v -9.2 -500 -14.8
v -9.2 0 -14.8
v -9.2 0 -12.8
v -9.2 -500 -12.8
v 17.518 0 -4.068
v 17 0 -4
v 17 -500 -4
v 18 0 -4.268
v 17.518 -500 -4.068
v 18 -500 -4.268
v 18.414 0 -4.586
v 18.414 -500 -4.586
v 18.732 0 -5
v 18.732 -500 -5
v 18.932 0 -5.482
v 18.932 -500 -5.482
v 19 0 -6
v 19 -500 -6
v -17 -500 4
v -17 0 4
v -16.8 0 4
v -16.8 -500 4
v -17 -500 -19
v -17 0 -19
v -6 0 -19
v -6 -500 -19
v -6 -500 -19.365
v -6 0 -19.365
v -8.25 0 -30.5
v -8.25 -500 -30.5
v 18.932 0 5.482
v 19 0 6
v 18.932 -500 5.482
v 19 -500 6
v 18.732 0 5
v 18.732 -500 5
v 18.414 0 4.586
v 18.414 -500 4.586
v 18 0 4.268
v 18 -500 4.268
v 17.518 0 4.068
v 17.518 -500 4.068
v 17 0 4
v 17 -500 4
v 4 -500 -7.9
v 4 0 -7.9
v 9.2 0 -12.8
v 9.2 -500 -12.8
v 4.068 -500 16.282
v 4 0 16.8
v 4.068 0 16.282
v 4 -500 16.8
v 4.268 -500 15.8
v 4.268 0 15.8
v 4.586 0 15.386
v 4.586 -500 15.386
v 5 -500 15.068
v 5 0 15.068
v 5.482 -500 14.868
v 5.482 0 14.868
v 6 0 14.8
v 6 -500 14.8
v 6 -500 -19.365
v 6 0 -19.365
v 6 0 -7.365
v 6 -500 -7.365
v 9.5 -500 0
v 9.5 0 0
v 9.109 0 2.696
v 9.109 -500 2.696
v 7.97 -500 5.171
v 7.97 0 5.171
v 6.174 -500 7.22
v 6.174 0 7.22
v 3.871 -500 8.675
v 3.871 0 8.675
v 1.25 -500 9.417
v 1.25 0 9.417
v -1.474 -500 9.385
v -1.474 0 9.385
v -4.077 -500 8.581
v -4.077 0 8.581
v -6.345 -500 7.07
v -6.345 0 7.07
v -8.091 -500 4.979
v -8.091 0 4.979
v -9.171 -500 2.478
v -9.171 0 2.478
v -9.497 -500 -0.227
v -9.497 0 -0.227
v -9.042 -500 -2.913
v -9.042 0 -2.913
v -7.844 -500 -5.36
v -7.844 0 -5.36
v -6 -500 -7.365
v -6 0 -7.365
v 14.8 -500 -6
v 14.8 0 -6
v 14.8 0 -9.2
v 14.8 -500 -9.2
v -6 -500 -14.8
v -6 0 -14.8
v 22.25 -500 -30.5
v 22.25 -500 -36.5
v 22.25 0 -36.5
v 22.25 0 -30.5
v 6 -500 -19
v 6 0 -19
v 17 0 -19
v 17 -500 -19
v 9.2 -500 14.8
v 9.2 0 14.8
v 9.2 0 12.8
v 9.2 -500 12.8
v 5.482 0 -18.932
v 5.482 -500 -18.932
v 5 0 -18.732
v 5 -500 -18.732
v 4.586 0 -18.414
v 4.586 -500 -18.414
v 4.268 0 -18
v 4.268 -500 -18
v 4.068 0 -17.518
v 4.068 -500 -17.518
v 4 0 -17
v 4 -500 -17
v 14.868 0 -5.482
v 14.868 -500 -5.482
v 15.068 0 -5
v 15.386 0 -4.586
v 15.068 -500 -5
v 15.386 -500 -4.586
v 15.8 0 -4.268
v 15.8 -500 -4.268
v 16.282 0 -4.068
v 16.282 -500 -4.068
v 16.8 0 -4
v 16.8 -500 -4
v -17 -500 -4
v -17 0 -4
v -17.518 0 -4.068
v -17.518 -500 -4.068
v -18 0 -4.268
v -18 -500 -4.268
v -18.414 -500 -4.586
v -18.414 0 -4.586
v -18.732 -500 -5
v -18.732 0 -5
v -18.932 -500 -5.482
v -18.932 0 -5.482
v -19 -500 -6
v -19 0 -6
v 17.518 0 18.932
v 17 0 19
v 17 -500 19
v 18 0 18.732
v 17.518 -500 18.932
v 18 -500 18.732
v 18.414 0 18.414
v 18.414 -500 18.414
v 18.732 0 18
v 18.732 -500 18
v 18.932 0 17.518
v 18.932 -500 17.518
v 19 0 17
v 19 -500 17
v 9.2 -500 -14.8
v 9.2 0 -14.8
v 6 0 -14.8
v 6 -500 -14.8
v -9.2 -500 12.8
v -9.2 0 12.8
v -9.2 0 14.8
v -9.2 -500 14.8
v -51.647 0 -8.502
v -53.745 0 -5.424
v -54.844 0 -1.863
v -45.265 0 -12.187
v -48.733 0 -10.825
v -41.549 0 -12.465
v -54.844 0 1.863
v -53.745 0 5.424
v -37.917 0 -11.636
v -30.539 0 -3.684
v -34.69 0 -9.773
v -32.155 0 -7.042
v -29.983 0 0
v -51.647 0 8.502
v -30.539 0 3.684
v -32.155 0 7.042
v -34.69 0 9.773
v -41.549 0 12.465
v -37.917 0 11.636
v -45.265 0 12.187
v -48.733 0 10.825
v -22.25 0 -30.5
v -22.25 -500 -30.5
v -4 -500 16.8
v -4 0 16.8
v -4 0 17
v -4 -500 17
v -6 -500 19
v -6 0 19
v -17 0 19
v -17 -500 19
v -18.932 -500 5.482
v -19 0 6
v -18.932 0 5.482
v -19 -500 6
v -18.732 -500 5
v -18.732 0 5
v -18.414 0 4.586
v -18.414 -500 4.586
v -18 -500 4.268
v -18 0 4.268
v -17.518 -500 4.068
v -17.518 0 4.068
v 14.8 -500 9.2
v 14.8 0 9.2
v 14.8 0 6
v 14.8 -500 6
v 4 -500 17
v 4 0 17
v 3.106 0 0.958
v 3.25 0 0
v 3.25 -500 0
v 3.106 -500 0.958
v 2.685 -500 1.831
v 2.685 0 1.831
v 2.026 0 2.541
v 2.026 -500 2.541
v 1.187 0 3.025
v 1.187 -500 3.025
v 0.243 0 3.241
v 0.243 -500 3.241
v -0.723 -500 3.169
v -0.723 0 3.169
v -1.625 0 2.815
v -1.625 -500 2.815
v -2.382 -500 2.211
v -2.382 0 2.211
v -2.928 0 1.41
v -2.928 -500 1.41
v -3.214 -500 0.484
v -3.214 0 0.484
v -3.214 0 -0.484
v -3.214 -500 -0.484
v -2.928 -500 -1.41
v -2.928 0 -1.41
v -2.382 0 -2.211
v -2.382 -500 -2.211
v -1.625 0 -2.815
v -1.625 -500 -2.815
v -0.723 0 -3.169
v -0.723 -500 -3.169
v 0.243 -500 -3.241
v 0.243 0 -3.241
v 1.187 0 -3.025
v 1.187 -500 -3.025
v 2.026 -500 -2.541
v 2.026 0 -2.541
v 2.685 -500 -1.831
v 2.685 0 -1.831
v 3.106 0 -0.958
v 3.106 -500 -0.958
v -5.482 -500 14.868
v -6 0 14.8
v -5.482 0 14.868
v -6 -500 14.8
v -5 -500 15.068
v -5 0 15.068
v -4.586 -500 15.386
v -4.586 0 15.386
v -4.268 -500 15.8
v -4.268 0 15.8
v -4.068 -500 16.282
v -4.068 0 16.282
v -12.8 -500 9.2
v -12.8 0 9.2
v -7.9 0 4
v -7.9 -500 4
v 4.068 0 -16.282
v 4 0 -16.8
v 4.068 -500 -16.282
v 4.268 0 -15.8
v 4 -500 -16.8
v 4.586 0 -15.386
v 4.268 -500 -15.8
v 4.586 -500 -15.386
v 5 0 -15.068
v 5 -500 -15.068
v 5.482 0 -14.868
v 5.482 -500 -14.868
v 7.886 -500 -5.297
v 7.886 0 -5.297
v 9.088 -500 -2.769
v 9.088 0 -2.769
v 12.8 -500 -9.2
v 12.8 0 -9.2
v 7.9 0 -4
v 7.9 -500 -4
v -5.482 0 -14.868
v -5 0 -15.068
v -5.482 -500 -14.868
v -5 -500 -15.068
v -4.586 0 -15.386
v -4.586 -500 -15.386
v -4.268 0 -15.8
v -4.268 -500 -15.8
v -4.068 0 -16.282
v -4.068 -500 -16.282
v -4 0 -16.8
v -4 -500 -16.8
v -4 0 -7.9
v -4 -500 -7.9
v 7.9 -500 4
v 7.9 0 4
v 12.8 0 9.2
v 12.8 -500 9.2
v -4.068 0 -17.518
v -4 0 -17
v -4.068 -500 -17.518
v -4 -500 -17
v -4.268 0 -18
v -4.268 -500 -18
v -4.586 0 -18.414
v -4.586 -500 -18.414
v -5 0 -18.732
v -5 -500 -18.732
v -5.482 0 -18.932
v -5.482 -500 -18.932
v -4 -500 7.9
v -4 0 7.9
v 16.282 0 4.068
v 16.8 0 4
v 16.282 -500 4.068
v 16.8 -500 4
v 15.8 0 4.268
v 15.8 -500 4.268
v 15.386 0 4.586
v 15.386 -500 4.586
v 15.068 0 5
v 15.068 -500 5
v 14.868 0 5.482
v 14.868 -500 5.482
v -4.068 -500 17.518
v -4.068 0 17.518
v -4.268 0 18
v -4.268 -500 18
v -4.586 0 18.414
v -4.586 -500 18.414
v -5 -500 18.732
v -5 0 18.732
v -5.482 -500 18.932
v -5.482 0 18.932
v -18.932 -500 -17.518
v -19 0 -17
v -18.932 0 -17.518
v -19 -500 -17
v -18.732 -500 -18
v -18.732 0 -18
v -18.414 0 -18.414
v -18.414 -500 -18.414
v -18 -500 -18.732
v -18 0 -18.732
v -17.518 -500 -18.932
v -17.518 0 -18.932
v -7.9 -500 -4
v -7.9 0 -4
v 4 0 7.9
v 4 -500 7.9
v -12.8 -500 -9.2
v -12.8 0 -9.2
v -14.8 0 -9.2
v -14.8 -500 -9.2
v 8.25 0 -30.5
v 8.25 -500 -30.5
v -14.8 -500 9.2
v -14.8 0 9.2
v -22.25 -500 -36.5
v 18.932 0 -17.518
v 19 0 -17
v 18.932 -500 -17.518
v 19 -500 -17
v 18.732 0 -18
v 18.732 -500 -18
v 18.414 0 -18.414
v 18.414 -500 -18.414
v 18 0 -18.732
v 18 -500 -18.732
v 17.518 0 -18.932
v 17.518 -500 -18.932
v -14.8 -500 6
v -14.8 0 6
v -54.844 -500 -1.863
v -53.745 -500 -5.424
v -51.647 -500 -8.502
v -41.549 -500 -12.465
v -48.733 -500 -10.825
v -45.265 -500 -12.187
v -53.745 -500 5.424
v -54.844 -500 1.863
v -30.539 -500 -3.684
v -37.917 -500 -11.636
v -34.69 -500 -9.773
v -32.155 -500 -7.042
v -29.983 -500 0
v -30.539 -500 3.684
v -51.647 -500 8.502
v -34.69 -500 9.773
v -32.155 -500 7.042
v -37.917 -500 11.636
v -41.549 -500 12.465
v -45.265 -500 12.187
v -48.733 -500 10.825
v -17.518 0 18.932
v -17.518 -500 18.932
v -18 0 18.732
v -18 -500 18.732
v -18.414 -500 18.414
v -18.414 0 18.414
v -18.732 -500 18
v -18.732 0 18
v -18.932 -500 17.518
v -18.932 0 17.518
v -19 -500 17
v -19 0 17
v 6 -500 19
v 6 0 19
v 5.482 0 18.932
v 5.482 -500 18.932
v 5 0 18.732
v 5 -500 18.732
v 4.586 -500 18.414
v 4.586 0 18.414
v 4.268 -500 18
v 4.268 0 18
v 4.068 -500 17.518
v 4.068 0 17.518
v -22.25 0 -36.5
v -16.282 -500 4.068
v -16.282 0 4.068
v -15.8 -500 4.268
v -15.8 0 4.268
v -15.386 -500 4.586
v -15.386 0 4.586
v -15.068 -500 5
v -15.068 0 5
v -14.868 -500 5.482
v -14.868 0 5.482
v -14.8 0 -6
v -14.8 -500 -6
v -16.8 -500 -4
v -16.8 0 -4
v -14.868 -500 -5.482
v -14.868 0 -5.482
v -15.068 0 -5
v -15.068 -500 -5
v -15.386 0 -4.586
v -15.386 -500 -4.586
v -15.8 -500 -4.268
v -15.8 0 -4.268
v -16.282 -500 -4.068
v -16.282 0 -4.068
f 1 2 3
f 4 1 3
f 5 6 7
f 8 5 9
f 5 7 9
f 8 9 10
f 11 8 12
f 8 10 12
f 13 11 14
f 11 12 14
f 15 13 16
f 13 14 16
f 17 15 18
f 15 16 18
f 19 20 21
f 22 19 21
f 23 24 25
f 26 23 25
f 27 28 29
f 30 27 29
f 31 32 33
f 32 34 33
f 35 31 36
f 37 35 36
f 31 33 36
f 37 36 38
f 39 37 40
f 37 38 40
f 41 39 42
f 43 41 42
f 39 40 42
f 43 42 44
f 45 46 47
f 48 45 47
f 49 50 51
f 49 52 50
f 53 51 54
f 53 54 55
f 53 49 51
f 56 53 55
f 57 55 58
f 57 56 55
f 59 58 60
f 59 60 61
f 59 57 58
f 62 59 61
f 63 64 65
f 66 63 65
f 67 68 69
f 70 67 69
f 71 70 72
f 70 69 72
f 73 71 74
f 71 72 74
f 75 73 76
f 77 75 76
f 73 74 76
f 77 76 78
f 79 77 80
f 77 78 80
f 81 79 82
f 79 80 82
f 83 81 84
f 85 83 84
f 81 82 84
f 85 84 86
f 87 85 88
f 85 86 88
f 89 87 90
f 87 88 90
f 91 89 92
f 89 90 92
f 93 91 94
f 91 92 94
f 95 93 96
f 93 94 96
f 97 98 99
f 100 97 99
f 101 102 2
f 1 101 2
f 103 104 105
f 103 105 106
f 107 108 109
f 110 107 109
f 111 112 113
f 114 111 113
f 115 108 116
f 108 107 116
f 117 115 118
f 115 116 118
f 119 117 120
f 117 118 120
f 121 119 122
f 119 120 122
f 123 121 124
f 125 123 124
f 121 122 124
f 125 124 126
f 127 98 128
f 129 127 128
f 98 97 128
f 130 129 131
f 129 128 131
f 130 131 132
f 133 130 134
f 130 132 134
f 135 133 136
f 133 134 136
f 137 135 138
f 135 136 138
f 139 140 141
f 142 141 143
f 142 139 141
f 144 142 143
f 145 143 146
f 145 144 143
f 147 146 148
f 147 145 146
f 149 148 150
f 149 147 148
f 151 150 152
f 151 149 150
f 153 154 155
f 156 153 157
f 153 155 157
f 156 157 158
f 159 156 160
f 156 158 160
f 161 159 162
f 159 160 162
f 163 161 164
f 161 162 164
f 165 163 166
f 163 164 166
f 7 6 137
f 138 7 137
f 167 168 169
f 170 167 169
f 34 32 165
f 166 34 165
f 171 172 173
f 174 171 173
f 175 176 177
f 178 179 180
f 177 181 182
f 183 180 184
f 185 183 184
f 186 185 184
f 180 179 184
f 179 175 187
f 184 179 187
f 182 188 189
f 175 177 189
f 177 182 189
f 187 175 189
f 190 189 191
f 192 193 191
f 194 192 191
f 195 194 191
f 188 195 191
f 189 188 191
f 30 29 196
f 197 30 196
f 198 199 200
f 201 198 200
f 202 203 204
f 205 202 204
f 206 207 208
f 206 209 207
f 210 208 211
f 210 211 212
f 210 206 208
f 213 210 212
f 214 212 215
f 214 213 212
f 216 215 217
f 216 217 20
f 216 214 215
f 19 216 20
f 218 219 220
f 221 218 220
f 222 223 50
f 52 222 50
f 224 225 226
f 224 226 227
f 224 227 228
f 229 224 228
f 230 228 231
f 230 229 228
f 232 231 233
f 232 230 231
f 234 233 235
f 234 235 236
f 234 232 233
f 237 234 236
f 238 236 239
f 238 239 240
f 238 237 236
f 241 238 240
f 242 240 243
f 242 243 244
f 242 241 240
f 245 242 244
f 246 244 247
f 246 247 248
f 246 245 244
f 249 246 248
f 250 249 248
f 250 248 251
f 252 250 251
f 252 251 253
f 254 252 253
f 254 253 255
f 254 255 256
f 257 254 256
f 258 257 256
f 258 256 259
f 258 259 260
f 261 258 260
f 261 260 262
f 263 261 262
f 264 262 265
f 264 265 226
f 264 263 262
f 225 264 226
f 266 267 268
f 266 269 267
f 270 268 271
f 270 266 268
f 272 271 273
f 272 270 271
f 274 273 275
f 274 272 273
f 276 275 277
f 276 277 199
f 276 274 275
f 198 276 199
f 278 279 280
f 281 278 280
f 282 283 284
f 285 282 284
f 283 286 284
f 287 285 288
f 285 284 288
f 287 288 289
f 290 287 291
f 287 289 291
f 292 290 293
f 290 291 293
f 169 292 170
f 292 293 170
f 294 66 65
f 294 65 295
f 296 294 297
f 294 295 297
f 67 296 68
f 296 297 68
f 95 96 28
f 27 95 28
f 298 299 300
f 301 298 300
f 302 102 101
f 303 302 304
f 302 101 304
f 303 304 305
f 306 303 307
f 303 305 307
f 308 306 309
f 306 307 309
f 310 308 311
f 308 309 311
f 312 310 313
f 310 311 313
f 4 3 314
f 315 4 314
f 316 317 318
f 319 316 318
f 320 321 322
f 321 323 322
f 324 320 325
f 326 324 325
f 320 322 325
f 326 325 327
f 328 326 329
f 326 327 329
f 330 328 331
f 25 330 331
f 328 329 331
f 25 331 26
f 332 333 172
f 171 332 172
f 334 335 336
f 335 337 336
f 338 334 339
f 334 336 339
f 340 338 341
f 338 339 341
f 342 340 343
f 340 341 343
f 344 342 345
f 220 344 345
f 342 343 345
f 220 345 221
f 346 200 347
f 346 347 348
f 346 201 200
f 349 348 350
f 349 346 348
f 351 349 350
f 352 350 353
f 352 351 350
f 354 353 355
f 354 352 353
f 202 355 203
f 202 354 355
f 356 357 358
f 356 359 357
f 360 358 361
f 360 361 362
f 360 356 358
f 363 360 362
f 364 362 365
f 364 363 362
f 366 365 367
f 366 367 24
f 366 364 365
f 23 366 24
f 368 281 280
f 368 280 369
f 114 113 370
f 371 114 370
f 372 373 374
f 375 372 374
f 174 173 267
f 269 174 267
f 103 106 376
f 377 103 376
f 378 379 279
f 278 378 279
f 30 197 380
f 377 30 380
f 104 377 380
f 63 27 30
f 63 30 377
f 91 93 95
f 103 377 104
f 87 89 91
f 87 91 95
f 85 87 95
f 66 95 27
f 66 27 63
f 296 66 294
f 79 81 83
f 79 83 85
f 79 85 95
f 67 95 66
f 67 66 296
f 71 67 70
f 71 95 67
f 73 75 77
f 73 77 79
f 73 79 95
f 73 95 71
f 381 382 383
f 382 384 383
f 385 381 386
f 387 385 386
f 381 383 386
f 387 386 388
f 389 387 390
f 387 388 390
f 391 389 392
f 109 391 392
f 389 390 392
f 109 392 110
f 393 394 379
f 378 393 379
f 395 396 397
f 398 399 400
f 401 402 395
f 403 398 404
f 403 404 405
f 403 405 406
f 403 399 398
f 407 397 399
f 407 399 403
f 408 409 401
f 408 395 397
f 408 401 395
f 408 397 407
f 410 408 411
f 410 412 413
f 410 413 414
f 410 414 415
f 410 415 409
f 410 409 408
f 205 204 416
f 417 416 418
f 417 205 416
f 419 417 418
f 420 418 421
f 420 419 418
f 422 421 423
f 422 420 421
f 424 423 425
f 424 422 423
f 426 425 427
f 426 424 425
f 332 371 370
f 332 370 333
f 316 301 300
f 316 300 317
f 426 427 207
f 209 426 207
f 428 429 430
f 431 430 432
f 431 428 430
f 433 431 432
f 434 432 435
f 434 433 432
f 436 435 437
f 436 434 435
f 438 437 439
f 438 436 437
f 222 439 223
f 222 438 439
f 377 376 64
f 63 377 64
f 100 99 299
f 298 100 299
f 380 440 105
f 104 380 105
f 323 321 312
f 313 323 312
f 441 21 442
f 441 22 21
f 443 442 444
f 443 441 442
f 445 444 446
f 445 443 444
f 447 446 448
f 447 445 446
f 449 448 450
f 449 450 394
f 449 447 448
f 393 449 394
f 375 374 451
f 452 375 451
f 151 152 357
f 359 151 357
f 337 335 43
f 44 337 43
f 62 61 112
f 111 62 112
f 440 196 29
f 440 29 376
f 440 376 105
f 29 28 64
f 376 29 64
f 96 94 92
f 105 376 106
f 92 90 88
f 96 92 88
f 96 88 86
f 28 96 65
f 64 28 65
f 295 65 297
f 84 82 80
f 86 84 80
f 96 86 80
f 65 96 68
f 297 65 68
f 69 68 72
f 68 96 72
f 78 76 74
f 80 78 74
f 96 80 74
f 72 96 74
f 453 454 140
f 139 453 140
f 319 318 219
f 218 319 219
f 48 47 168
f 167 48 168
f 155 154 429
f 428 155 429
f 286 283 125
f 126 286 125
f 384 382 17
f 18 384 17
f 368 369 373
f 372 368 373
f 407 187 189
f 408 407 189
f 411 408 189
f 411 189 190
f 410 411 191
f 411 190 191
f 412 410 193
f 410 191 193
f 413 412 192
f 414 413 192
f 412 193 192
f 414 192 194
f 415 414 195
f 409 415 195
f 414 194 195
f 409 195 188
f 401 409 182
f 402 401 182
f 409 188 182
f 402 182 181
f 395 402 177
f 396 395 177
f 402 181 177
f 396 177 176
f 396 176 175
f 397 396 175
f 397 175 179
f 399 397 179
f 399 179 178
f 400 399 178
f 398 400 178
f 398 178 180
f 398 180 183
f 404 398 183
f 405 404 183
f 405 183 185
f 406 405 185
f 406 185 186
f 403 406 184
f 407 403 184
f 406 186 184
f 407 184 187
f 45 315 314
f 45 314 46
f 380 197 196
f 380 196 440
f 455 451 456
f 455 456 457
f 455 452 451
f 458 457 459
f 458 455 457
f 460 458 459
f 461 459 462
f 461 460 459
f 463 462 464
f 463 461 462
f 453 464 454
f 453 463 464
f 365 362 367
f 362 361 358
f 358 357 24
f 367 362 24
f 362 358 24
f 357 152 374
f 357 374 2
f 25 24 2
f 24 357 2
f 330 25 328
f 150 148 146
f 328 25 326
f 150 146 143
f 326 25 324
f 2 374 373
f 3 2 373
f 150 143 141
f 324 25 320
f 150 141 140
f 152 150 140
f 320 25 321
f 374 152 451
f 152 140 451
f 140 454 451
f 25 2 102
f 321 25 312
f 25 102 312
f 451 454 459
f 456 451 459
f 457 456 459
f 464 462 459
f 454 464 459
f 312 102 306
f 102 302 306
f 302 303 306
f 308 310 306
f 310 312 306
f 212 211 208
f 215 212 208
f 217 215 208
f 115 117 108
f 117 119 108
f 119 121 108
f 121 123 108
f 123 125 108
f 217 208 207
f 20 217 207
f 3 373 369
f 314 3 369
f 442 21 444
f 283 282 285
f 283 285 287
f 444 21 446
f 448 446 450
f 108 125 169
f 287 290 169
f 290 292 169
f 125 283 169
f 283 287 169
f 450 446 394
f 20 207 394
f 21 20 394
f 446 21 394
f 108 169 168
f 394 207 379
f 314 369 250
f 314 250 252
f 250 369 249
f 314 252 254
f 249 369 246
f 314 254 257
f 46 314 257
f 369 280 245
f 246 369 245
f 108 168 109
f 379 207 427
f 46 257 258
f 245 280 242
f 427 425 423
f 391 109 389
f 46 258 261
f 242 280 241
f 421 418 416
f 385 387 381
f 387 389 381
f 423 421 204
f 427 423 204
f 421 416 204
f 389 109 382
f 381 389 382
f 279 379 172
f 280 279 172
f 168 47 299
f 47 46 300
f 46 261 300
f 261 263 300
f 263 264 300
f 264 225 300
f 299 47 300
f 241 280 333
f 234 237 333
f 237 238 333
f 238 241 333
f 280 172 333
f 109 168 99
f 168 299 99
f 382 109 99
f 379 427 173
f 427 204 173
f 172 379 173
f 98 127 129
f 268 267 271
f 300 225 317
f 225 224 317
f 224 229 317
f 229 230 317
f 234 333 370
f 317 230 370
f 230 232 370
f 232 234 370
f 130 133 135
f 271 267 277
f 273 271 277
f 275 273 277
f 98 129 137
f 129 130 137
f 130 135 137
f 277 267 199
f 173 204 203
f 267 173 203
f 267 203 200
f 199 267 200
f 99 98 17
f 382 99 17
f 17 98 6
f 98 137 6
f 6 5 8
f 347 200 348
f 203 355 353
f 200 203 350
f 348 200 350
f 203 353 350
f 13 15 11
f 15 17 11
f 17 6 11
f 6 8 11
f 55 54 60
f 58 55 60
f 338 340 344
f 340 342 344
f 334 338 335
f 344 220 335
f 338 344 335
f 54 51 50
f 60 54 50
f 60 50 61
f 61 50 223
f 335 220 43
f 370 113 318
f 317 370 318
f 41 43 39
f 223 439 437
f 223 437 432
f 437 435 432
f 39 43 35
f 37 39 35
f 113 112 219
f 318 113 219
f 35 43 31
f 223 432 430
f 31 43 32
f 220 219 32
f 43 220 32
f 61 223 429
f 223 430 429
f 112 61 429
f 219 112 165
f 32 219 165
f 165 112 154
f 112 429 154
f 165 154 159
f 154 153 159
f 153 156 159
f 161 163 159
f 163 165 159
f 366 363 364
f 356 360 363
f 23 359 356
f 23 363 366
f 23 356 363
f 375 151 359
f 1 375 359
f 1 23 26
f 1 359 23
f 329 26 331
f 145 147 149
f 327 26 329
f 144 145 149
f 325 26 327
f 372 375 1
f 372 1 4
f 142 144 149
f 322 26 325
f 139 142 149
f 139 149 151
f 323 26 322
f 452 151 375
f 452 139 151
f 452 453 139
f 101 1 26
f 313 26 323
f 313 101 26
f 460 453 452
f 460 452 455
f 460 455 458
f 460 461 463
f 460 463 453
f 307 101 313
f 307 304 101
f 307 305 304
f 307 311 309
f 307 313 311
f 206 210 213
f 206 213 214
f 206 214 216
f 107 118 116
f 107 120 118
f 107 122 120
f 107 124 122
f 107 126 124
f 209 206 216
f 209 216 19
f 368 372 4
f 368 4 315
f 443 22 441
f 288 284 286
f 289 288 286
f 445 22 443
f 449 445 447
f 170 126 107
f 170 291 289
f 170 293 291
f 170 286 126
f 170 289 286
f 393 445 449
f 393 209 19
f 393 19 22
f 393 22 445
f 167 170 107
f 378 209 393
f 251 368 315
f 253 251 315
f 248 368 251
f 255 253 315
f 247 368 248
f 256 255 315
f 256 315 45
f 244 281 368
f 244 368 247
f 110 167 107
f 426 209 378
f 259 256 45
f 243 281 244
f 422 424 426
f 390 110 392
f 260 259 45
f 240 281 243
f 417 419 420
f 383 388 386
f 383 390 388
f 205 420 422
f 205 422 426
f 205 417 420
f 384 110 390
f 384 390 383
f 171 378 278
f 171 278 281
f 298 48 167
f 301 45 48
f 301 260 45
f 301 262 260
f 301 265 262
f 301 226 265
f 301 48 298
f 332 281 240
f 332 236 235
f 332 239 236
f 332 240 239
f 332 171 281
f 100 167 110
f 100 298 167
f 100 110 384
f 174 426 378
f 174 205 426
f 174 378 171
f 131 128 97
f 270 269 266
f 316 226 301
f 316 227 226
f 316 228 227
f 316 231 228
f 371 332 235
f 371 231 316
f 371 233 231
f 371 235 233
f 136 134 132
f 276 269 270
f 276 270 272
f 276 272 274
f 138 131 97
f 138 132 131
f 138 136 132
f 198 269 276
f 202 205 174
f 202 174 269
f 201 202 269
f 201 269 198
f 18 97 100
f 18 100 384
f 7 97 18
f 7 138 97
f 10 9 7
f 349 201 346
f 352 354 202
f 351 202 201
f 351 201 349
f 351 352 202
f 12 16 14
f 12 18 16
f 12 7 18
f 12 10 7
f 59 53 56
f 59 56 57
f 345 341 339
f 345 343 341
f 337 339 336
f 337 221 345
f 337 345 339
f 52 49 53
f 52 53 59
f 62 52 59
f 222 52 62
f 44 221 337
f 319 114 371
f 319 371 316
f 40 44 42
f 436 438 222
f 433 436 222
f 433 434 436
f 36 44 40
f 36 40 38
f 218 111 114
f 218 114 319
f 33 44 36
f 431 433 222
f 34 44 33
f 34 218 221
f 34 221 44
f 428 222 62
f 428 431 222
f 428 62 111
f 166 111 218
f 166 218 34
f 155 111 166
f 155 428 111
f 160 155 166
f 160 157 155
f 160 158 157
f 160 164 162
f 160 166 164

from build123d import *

# Parameters (mm, degrees)
F1_DEPTH = 500
F2_R     = 12.5
F3_DEPTH = 500
F4_R     = 3.25
F5_DEPTH = 500
F6_R     = 2


with BuildPart() as f1:
    # F0 (on Front) → F1 (new body)
    with BuildSketch(Plane.XZ):
        with BuildLine():
            ThreePointArc((6, -7.3654599313), (8.5805011509, -4.0773766076), (9.5, 0))
            ThreePointArc((9.5, 0), (-4.0773766076, 8.5805011509), (-6, -7.3654599313))
            Line((-6, -7.3654599313), (6, -7.3654599313))
        make_face()
        with BuildLine():
            Line((6, -7.3654599313), (-6, -7.3654599313))
            ThreePointArc((-6, -7.3654599313), (0, -9.5), (6, -7.3654599313))
        make_face()
        with BuildLine():
            ThreePointArc((6, -7.3654599313), (0, -9.5), (-6, -7.3654599313))
            Line((-6, -7.3654599313), (-6, -19.3654599313))
            Line((-6, -19.3654599313), (6, -19.3654599313))
            Line((6, -19.3654599313), (6, -7.3654599313))
        make_face()
        Polygon((6, -19.3654599313), (-6, -19.3654599313), (-8.25, -30.5), (8.25, -30.5), align=None)
        Polygon((8.25, -30.5), (-8.25, -30.5), (-22.25, -30.5), (-22.25, -36.5), (22.25, -36.5), (22.25, -30.5), align=None)
    extrude(amount=F1_DEPTH)


with BuildPart() as f3:
    # F2 (on Front) → F3 (new body)
    with BuildSketch(Plane.XZ):
        with Locations((-42.4833704354, 0)):
            Circle(F2_R)
    extrude(amount=F3_DEPTH)


with BuildPart() as f5:
    # F4 (on Front) → F5 (new body)
    with BuildSketch(Plane.XZ):
        Polygon((19, 19), (4, 19), (4, 14.8), (9.2, 14.8), (9.2, 12.8), (4, 7.9), (-4, 7.9), (-9.2, 12.8), (-9.2, 14.8), (-4, 14.8), (-4, 19), (-19, 19), (-19, 4), (-14.8, 4), (-14.8, 9.2), (-12.8, 9.2), (-7.9, 4), (-7.9, -4), (-12.8, -9.2), (-14.8, -9.2), (-14.8, -4), (-19, -4), (-19, -19), (-4, -19), (-4, -14.8), (-9.2, -14.8), (-9.2, -12.8), (-4, -7.9), (4, -7.9), (9.2, -12.8), (9.2, -14.8), (4, -14.8), (4, -19), (19, -19), (19, -4), (14.8, -4), (14.8, -9.2), (12.8, -9.2), (7.9, -4), (7.9, 4), (12.8, 9.2), (14.8, 9.2), (14.8, 4), (19, 4), align=None)
        Circle(F4_R, mode=Mode.SUBTRACT)
    extrude(amount=F5_DEPTH)

    # F6
    f6_edges = [f5.edges().sort_by_distance(p)[0] for p in [
        (-19, -250, 19),
        (19, -250, 19),
        (19, -250, 4),
        (19, -250, -4),
        (19, -250, -19),
        (-4, -250, -19),
        (-4, -250, 19),
        (4, -250, 19),
        (-14.8, -250, 4),
        (-19, -250, -4),
        (-19, -250, -19),
        (4, -250, -19),
        (4, -250, -14.8),
        (14.8, -250, -4),
        (14.8, -250, 4),
        (4, -250, 14.8),
        (-19, -250, 4),
        (-14.8, -250, -4),
        (-4, -250, -14.8),
        (-4, -250, 14.8),
    ]]
    fillet(f6_edges, radius=F6_R)


solid = Compound([f1.part, f3.part, f5.part])
